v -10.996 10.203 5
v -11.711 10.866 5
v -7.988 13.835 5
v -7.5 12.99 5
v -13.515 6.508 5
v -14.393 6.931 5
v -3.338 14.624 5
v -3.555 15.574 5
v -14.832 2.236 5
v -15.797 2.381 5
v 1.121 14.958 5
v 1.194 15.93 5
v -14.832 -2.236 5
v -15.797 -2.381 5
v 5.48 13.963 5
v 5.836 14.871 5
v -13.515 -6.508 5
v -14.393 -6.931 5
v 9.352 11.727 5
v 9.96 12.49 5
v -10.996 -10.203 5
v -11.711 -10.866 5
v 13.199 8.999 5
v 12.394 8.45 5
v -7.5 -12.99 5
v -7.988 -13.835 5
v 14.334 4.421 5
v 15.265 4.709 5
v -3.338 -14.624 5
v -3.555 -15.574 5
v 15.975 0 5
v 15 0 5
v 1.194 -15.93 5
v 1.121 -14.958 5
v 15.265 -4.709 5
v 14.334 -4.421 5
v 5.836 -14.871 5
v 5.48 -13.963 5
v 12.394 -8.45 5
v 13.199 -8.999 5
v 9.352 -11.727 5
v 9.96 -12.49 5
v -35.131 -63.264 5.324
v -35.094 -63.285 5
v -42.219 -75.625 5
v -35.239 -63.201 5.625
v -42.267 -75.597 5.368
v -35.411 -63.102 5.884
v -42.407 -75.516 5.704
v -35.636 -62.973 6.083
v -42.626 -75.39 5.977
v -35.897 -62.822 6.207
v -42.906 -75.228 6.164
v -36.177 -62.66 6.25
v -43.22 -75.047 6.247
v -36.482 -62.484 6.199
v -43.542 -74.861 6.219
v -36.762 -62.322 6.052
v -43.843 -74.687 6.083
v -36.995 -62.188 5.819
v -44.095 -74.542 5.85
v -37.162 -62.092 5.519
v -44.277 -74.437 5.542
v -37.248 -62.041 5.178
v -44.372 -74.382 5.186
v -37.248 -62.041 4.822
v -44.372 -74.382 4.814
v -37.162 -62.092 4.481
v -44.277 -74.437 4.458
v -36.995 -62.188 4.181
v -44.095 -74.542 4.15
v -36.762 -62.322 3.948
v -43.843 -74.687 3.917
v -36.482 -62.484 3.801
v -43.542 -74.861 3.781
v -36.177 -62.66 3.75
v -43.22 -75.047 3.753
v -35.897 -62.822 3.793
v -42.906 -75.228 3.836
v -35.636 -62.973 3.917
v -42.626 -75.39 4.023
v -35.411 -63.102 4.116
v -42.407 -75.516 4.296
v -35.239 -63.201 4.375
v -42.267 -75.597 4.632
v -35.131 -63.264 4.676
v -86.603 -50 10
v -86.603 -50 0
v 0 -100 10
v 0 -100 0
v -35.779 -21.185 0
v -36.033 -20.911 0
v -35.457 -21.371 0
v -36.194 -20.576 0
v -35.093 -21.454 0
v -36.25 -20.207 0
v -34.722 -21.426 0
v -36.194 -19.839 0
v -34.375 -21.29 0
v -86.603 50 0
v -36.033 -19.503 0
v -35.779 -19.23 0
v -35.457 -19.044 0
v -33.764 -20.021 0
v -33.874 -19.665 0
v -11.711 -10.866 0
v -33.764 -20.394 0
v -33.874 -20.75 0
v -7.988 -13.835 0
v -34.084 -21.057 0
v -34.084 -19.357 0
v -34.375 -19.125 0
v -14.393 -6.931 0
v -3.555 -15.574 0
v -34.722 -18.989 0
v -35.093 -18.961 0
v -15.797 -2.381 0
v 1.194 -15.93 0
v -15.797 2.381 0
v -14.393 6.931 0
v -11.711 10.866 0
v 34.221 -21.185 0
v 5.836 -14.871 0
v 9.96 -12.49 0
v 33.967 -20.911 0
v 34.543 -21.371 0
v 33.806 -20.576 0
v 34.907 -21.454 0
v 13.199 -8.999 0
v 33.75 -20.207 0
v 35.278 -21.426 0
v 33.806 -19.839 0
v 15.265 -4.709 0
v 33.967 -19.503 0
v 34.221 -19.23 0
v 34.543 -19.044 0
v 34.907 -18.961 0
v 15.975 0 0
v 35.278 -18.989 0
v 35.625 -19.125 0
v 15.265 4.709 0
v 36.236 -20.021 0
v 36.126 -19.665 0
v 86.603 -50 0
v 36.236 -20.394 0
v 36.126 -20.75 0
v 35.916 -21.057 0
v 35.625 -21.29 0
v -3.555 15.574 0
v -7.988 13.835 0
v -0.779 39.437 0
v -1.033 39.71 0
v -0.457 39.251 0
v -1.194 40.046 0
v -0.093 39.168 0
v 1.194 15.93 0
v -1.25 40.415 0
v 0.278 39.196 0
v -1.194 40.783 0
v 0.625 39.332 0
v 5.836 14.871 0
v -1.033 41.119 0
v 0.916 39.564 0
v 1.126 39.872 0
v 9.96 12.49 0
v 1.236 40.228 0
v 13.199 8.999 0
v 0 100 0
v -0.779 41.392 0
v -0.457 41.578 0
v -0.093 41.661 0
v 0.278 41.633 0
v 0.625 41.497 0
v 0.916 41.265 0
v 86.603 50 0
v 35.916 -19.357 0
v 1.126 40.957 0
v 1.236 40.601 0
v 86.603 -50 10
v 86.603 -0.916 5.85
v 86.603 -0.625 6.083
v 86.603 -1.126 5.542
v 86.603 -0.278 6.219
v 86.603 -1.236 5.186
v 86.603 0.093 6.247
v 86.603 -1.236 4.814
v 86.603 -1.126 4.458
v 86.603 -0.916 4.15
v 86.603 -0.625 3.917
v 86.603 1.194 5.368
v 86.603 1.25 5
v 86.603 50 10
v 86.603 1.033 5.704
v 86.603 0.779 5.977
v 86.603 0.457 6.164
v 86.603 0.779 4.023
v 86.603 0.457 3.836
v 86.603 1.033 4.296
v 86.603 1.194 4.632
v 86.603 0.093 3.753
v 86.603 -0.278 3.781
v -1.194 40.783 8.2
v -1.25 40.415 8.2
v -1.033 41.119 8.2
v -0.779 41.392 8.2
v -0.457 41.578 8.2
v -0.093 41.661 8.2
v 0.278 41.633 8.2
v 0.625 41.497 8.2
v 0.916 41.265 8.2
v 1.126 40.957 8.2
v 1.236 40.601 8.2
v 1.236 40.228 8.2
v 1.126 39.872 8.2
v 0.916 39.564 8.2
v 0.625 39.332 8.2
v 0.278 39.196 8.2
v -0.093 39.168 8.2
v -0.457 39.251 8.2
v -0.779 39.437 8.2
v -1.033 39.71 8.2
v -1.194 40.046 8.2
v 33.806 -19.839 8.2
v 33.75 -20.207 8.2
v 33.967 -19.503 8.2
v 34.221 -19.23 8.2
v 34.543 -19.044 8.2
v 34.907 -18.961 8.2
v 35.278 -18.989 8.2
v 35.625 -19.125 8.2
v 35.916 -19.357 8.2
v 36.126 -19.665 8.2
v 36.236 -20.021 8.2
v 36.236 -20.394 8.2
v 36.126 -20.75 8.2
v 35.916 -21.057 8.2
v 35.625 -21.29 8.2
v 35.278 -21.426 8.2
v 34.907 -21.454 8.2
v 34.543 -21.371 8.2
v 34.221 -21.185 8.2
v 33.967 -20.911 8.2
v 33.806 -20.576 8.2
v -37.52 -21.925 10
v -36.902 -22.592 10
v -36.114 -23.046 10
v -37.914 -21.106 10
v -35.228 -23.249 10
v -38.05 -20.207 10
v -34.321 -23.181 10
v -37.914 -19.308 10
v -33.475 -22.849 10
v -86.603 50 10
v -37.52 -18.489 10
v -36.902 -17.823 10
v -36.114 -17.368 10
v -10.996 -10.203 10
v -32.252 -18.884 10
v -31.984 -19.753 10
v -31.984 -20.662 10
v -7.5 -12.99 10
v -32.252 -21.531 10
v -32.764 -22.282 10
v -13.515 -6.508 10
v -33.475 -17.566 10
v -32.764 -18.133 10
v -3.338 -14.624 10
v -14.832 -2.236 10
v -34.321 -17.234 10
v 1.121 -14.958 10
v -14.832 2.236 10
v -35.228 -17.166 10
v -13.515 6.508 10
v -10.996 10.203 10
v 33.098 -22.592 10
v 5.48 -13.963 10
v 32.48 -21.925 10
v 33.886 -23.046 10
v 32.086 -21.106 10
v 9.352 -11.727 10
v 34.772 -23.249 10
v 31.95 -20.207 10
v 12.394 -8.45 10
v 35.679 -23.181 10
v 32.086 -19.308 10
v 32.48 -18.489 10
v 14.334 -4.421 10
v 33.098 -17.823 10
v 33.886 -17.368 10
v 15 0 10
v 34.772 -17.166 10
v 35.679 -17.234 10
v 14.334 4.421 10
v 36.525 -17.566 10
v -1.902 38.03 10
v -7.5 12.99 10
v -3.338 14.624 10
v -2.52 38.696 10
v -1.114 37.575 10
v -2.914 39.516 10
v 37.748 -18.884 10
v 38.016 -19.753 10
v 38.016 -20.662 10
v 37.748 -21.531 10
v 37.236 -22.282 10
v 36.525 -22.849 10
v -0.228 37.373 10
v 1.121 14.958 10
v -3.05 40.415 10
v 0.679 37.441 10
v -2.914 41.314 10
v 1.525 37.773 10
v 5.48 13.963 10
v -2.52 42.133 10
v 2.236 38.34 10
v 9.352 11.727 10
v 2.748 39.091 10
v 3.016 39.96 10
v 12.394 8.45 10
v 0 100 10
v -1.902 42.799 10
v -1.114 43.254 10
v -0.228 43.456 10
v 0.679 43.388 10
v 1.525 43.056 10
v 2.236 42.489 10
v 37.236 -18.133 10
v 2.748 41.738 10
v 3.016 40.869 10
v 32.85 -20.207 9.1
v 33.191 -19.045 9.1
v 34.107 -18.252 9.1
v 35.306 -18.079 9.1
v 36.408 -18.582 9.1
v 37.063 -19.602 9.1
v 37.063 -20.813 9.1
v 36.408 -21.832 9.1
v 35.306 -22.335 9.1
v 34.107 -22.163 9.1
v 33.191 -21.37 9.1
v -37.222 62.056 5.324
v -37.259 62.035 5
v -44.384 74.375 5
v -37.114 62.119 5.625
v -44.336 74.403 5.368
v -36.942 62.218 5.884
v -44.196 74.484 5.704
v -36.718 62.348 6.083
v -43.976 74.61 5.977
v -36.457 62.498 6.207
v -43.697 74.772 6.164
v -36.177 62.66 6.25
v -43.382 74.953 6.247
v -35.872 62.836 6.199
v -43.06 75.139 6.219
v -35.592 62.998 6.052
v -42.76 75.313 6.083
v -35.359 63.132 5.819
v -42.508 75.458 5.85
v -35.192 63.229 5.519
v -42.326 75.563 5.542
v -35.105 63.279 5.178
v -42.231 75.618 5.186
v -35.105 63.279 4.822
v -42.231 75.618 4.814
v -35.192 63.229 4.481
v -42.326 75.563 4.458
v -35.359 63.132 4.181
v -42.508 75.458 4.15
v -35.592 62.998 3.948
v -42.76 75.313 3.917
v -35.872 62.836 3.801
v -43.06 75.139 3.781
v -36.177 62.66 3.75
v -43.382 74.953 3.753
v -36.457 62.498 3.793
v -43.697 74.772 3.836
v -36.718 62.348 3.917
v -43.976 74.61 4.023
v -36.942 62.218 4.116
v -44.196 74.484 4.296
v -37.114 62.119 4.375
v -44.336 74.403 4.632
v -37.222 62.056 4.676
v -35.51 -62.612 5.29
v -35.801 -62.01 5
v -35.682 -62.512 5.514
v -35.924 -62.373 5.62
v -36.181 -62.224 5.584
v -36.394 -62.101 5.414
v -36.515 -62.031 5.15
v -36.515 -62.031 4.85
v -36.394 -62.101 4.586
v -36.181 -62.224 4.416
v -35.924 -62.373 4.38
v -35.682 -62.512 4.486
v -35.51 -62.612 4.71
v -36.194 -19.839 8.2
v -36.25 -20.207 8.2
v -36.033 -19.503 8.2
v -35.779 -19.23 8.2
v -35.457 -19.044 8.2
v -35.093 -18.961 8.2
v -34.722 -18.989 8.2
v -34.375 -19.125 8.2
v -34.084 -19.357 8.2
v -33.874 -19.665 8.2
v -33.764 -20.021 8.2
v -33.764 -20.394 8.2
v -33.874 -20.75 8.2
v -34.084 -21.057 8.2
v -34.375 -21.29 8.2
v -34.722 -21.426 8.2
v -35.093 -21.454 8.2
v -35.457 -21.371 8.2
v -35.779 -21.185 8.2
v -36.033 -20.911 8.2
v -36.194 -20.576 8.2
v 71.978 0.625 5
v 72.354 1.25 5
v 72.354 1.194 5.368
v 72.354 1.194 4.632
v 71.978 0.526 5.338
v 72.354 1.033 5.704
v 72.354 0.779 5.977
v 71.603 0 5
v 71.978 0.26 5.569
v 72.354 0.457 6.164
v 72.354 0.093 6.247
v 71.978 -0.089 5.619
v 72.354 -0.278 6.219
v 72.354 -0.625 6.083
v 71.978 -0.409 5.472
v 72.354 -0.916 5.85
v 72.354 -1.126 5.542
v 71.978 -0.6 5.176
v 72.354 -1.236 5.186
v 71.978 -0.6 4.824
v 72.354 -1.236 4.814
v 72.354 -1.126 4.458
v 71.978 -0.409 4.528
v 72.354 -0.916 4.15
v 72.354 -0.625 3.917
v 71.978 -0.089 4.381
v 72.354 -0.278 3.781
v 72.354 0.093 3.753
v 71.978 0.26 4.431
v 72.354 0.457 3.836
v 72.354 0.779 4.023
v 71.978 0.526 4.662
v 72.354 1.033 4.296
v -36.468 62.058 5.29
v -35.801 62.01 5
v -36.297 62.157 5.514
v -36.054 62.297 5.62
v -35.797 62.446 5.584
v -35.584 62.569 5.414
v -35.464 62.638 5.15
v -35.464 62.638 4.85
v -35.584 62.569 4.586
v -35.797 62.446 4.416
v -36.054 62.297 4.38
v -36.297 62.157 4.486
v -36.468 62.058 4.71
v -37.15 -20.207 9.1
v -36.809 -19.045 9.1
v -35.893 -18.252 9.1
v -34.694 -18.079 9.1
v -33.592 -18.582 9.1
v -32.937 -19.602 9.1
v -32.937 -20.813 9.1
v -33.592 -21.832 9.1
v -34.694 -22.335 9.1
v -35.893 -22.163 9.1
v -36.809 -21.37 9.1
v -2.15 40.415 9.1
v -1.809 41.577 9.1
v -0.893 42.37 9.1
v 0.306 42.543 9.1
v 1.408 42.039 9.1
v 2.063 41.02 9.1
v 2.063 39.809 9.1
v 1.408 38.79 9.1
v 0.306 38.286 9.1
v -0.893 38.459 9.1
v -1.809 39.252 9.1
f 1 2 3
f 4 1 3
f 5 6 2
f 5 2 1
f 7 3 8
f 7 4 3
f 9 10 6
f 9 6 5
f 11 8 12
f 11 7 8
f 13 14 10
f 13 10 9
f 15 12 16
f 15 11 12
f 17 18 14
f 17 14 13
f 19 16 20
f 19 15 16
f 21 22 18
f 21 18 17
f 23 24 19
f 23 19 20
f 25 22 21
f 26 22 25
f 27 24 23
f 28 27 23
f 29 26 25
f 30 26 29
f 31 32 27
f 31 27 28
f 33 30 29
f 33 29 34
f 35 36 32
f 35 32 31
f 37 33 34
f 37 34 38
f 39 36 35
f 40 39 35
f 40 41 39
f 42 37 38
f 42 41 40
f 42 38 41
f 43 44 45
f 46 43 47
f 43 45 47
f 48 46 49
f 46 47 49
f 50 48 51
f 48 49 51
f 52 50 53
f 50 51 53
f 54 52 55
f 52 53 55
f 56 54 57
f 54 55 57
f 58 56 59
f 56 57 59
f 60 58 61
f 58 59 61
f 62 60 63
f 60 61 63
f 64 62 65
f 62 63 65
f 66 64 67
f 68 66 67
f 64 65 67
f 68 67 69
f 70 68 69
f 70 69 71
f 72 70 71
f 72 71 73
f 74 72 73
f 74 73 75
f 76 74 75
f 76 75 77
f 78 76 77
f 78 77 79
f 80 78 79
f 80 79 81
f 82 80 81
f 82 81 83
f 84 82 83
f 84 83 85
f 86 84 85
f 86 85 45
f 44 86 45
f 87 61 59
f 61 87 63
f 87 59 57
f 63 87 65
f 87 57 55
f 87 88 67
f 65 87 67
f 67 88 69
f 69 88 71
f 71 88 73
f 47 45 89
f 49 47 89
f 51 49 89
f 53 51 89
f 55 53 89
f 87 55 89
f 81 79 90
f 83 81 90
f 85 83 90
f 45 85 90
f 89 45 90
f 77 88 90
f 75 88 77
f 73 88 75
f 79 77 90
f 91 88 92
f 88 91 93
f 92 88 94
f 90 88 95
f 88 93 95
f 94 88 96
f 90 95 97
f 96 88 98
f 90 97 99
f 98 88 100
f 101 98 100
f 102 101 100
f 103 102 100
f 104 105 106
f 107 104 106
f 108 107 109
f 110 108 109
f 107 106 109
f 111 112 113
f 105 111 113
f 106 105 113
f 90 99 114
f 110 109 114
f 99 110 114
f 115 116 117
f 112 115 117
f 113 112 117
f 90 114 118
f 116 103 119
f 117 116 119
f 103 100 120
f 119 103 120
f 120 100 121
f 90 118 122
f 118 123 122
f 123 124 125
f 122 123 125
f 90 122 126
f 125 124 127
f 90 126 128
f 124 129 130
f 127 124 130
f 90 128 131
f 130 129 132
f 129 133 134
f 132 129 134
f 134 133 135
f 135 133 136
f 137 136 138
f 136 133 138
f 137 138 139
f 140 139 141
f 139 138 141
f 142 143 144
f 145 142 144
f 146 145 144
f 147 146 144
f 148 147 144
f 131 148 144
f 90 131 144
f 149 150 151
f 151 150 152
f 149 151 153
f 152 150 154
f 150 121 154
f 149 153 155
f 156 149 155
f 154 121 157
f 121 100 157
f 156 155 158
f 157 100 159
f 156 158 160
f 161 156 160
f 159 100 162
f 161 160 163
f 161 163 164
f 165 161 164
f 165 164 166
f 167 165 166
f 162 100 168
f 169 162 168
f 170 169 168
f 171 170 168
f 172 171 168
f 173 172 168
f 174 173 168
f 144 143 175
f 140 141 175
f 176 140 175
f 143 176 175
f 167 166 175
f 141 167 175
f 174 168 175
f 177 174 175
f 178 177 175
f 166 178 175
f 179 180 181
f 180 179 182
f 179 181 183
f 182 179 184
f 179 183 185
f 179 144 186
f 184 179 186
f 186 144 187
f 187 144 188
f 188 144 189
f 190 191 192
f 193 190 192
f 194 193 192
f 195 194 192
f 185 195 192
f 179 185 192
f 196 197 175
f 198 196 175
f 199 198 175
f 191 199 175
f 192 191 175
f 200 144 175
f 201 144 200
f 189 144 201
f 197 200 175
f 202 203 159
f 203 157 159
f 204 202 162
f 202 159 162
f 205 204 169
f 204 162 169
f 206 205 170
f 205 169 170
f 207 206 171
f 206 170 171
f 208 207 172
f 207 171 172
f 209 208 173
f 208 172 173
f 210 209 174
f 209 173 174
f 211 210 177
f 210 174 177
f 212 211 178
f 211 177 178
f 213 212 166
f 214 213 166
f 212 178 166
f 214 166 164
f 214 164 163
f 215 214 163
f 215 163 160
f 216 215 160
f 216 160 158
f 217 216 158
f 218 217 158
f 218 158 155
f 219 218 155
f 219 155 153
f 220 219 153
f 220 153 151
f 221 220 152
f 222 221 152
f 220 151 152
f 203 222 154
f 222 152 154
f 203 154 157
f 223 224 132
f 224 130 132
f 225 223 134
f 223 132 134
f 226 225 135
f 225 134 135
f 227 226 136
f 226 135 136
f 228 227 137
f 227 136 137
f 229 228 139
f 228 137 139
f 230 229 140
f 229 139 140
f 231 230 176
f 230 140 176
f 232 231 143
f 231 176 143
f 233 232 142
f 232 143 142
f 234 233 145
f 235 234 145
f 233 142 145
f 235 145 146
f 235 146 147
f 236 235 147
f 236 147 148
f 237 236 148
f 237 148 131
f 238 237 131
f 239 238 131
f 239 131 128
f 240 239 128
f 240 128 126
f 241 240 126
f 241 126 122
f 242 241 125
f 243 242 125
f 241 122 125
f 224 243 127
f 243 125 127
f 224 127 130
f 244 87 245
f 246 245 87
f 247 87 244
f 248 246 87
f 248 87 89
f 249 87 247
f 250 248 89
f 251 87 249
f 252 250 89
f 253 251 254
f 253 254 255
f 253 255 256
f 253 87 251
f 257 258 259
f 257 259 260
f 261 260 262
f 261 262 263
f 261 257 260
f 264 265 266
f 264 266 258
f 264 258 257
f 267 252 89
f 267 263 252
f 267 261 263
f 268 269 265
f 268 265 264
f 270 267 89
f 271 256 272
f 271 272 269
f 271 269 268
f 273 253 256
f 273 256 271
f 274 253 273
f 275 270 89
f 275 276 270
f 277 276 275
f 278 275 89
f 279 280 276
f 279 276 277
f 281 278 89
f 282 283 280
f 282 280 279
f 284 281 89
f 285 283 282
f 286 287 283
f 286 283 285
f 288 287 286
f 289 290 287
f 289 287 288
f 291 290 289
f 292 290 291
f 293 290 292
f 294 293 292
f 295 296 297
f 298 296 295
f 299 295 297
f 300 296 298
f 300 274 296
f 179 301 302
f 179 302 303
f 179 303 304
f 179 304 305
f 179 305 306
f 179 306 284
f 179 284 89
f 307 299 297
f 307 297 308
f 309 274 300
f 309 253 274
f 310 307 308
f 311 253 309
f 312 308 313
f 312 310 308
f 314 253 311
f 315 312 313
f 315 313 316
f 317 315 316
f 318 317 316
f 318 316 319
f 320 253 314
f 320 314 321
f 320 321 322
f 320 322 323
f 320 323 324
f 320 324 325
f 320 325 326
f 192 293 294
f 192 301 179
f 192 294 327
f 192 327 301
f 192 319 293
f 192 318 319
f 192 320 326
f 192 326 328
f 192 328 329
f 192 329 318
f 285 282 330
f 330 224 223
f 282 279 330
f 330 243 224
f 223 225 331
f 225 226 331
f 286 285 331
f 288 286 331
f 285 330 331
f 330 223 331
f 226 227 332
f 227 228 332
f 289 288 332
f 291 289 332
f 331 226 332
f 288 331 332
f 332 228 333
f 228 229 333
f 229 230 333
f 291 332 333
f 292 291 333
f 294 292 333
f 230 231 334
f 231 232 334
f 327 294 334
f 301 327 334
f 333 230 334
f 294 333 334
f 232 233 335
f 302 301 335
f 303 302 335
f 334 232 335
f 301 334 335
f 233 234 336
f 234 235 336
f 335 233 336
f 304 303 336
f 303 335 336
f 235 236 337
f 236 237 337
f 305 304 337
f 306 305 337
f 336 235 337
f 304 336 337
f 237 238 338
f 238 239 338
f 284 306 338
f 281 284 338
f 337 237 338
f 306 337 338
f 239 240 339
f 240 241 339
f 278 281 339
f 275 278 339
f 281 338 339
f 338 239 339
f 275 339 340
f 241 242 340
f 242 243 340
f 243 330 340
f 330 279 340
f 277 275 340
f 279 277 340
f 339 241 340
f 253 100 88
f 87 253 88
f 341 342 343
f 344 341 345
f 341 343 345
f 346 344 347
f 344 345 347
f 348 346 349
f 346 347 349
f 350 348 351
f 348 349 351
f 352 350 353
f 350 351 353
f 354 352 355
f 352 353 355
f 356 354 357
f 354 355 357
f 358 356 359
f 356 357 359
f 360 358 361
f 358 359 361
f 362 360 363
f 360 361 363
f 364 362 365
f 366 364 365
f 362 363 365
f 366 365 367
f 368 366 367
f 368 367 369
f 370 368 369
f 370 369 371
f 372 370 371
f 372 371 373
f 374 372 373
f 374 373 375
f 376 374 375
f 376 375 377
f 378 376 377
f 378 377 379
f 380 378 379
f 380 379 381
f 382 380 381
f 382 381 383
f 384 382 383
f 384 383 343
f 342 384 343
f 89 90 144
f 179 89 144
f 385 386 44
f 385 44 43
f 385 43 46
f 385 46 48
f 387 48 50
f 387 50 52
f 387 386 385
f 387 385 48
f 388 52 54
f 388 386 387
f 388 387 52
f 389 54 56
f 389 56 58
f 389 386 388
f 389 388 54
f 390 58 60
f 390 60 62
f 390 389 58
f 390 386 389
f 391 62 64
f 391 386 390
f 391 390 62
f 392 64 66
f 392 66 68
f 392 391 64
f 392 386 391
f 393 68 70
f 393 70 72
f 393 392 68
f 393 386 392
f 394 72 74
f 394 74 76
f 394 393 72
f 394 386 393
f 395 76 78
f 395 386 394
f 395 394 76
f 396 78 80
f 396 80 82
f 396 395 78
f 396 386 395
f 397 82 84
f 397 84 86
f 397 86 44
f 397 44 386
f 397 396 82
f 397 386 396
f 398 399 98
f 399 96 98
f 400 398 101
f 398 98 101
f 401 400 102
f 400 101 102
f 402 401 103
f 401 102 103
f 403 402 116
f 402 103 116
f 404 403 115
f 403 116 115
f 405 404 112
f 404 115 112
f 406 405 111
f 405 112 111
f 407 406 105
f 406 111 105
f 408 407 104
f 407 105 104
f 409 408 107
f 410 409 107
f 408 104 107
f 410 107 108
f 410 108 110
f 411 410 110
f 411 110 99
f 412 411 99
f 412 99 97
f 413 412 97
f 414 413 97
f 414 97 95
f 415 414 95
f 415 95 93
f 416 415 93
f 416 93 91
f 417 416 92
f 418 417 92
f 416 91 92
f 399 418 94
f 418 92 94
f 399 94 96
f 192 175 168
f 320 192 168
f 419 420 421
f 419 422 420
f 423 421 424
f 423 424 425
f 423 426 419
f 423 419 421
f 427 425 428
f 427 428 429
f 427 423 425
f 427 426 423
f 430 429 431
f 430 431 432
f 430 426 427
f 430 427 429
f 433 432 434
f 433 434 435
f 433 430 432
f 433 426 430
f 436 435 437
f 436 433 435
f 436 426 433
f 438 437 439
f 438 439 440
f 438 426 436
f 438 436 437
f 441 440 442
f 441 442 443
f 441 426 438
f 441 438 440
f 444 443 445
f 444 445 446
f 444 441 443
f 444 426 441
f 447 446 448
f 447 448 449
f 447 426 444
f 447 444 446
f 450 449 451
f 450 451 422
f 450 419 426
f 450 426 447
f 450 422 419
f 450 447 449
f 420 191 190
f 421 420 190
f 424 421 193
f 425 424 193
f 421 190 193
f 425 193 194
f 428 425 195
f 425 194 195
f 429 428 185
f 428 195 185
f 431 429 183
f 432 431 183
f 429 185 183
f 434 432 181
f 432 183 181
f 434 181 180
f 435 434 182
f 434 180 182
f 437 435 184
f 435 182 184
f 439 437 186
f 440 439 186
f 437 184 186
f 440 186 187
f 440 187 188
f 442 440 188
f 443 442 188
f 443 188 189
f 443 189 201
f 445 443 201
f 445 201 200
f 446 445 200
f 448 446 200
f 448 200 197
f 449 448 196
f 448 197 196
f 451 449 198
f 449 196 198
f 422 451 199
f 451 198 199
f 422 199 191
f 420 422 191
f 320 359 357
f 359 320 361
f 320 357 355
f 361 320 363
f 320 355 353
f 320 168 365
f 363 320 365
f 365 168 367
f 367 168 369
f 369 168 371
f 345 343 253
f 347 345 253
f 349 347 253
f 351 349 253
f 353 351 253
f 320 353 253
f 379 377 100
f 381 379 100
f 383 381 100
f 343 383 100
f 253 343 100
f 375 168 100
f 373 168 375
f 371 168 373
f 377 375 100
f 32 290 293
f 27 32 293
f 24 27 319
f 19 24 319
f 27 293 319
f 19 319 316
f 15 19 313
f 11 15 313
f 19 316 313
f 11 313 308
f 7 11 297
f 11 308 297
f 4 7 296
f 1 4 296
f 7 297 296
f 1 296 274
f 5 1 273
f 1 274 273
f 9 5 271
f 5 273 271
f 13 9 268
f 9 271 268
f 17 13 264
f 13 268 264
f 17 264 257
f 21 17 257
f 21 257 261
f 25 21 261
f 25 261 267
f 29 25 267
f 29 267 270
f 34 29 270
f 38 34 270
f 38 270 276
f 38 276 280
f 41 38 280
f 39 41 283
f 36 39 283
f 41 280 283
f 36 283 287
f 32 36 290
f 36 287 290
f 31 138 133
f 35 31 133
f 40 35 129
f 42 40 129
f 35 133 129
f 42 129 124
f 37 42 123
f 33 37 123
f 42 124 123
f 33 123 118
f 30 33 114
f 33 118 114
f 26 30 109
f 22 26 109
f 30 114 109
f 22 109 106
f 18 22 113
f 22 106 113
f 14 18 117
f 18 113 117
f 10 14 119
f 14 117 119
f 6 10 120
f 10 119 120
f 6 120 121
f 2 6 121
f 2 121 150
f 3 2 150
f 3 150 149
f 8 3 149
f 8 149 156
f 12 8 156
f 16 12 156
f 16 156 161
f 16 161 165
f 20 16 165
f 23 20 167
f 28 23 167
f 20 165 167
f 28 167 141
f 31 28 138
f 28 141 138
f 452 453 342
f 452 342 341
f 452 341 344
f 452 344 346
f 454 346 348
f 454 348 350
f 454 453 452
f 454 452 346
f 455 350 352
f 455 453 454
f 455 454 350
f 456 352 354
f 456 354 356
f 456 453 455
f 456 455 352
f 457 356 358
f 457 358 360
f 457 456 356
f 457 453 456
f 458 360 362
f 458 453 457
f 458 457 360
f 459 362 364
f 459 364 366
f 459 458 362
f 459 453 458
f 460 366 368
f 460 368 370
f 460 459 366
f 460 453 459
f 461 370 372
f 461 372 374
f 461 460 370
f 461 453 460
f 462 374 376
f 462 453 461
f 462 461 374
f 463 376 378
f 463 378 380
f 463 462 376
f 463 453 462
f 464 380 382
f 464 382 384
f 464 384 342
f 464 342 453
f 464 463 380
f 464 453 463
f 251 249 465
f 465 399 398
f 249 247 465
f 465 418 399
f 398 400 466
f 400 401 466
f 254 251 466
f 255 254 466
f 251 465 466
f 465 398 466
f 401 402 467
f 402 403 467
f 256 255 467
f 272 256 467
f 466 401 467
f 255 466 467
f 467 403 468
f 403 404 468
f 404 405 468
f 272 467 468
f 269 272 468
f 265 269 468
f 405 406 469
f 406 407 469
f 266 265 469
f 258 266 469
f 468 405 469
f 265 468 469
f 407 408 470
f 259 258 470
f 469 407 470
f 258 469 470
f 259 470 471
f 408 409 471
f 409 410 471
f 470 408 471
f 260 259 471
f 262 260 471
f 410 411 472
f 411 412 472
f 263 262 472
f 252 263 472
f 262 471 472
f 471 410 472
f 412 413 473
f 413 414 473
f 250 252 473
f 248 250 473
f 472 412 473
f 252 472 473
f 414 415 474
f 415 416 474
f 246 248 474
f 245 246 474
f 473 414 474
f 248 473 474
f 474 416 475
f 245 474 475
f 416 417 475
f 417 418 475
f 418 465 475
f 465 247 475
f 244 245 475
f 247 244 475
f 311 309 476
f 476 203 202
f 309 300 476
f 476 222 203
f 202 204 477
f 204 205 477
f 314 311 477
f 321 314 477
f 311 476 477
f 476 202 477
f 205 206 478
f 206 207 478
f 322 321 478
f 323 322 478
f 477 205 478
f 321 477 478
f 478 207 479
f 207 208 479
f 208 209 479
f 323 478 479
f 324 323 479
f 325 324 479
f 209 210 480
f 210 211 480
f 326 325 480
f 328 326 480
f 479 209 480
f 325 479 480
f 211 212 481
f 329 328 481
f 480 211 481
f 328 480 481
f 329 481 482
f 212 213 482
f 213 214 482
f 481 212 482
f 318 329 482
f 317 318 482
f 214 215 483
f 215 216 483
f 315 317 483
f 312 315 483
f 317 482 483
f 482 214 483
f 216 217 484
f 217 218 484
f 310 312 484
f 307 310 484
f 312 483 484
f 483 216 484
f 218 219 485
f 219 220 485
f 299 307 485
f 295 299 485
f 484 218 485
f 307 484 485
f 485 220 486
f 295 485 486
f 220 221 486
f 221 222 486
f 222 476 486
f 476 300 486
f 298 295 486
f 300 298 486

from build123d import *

# Parameters (mm, degrees)
PAD041_DEPTH        = 10
SKETCH094_R         = 15.975
POCKET017_DEPTH     = 5
SKETCH093_R         = 15
POCKET018_DEPTH     = 5
HOLE016_D           = 2.5
HOLE016_DEPTH       = 25
HOLE016_CSINK_D     = 6.1
HOLE016_CSINK_ANGLE = 90
SKETCH096_R         = 1.25
HOLE017_DEPTH       = 14.248924
HOLE017_TIPS_R      = 1.25
SKETCH097_R         = 1.25
HOLE018_DEPTH       = 14.248924
HOLE018_TIPS_R      = 1.25
SKETCH_R            = 1.25
HOLE_DEPTH          = 14.248924
HOLE_TIPS_R         = 1.25


with BuildPart() as part:
    # Sketch092 → Pad041 (new body)
    with BuildSketch(Plane.XY):
        Polygon((86.60254, 50), (0, 100), (-86.60254, 50), (-86.60254, -50), (0, -100), (86.60254, -50), align=None)
    extrude(amount=PAD041_DEPTH)

    # Sketch094 → Pocket017 (cut)
    with BuildSketch(Plane(origin=(0, 0, 0), x_dir=(1, 0, 0), z_dir=(0, 0, -1))):
        Circle(SKETCH094_R)
    extrude(amount=-POCKET017_DEPTH, mode=Mode.SUBTRACT)

    # Sketch093 → Pocket018 (cut)
    with BuildSketch(Plane.XY.offset(10)):
        Circle(SKETCH093_R)
    extrude(amount=-POCKET018_DEPTH, mode=Mode.SUBTRACT)

    # Hole016
    with Locations(Plane.XY.offset(10)):
        with Locations((0, 40.414519), (35, -20.207259), (-35, -20.207259)):
            CounterSinkHole(HOLE016_D / 2, HOLE016_CSINK_D / 2, depth=HOLE016_DEPTH, counter_sink_angle=HOLE016_CSINK_ANGLE)

    # Sketch096 (on Face2 of Hole016) → Hole017 (cut)
    with BuildSketch(Plane.YZ.offset(86.60254)):
        with Locations((0, 5)):
            Circle(SKETCH096_R)
    extrude(amount=-HOLE017_DEPTH, mode=Mode.SUBTRACT)

    # Hole017 tips → Hole017 tip 1 section 0
    with BuildSketch(Plane.YZ.offset(72.353616), mode=Mode.PRIVATE) as hole017_tip_1_s0:
        with Locations((0, 5)):
            Circle(HOLE017_TIPS_R)
    loft([hole017_tip_1_s0.sketch, Vertex(71.60254, 0, 5)], mode=Mode.SUBTRACT)

    # Sketch097 (on Face3 of Hole017) → Hole018 (cut)
    with BuildSketch(Plane(origin=(-43.30127, 75, 0), x_dir=(-0.866025, -0.5, 0), z_dir=(-0.5, 0.866025, 0))):
        with Locations((0, 5)):
            Circle(SKETCH097_R)
    extrude(amount=-HOLE018_DEPTH, mode=Mode.SUBTRACT)

    # Hole018 tips → Hole018 tip 1 section 0
    with BuildSketch(Plane(origin=(-36.176808, 62.66007, 0), x_dir=(-0.866025, -0.5, 0), z_dir=(-0.5, 0.866025, 0)), mode=Mode.PRIVATE) as hole018_tip_1_s0:
        with Locations((0, 5)):
            Circle(HOLE018_TIPS_R)
    loft([hole018_tip_1_s0.sketch, Vertex(-35.80127, 62.009619, 5)], mode=Mode.SUBTRACT)

    # Sketch (on Face10 of Hole018) → Hole (cut)
    with BuildSketch(Plane(origin=(-43.30127, -75, 0), x_dir=(0.866025, -0.5, 0), z_dir=(-0.5, -0.866025, 0))):
        with Locations((0, 5)):
            Circle(SKETCH_R)
    extrude(amount=-HOLE_DEPTH, mode=Mode.SUBTRACT)

    # Hole tips → Hole tip 1 section 0
    with BuildSketch(Plane(origin=(-36.176808, -62.66007, 0), x_dir=(0.866025, -0.5, 0), z_dir=(-0.5, -0.866025, 0)), mode=Mode.PRIVATE) as hole_tip_1_s0:
        with Locations((0, 5)):
            Circle(HOLE_TIPS_R)
    loft([hole_tip_1_s0.sketch, Vertex(-35.80127, -62.009619, 5)], mode=Mode.SUBTRACT)


solid = part.part
